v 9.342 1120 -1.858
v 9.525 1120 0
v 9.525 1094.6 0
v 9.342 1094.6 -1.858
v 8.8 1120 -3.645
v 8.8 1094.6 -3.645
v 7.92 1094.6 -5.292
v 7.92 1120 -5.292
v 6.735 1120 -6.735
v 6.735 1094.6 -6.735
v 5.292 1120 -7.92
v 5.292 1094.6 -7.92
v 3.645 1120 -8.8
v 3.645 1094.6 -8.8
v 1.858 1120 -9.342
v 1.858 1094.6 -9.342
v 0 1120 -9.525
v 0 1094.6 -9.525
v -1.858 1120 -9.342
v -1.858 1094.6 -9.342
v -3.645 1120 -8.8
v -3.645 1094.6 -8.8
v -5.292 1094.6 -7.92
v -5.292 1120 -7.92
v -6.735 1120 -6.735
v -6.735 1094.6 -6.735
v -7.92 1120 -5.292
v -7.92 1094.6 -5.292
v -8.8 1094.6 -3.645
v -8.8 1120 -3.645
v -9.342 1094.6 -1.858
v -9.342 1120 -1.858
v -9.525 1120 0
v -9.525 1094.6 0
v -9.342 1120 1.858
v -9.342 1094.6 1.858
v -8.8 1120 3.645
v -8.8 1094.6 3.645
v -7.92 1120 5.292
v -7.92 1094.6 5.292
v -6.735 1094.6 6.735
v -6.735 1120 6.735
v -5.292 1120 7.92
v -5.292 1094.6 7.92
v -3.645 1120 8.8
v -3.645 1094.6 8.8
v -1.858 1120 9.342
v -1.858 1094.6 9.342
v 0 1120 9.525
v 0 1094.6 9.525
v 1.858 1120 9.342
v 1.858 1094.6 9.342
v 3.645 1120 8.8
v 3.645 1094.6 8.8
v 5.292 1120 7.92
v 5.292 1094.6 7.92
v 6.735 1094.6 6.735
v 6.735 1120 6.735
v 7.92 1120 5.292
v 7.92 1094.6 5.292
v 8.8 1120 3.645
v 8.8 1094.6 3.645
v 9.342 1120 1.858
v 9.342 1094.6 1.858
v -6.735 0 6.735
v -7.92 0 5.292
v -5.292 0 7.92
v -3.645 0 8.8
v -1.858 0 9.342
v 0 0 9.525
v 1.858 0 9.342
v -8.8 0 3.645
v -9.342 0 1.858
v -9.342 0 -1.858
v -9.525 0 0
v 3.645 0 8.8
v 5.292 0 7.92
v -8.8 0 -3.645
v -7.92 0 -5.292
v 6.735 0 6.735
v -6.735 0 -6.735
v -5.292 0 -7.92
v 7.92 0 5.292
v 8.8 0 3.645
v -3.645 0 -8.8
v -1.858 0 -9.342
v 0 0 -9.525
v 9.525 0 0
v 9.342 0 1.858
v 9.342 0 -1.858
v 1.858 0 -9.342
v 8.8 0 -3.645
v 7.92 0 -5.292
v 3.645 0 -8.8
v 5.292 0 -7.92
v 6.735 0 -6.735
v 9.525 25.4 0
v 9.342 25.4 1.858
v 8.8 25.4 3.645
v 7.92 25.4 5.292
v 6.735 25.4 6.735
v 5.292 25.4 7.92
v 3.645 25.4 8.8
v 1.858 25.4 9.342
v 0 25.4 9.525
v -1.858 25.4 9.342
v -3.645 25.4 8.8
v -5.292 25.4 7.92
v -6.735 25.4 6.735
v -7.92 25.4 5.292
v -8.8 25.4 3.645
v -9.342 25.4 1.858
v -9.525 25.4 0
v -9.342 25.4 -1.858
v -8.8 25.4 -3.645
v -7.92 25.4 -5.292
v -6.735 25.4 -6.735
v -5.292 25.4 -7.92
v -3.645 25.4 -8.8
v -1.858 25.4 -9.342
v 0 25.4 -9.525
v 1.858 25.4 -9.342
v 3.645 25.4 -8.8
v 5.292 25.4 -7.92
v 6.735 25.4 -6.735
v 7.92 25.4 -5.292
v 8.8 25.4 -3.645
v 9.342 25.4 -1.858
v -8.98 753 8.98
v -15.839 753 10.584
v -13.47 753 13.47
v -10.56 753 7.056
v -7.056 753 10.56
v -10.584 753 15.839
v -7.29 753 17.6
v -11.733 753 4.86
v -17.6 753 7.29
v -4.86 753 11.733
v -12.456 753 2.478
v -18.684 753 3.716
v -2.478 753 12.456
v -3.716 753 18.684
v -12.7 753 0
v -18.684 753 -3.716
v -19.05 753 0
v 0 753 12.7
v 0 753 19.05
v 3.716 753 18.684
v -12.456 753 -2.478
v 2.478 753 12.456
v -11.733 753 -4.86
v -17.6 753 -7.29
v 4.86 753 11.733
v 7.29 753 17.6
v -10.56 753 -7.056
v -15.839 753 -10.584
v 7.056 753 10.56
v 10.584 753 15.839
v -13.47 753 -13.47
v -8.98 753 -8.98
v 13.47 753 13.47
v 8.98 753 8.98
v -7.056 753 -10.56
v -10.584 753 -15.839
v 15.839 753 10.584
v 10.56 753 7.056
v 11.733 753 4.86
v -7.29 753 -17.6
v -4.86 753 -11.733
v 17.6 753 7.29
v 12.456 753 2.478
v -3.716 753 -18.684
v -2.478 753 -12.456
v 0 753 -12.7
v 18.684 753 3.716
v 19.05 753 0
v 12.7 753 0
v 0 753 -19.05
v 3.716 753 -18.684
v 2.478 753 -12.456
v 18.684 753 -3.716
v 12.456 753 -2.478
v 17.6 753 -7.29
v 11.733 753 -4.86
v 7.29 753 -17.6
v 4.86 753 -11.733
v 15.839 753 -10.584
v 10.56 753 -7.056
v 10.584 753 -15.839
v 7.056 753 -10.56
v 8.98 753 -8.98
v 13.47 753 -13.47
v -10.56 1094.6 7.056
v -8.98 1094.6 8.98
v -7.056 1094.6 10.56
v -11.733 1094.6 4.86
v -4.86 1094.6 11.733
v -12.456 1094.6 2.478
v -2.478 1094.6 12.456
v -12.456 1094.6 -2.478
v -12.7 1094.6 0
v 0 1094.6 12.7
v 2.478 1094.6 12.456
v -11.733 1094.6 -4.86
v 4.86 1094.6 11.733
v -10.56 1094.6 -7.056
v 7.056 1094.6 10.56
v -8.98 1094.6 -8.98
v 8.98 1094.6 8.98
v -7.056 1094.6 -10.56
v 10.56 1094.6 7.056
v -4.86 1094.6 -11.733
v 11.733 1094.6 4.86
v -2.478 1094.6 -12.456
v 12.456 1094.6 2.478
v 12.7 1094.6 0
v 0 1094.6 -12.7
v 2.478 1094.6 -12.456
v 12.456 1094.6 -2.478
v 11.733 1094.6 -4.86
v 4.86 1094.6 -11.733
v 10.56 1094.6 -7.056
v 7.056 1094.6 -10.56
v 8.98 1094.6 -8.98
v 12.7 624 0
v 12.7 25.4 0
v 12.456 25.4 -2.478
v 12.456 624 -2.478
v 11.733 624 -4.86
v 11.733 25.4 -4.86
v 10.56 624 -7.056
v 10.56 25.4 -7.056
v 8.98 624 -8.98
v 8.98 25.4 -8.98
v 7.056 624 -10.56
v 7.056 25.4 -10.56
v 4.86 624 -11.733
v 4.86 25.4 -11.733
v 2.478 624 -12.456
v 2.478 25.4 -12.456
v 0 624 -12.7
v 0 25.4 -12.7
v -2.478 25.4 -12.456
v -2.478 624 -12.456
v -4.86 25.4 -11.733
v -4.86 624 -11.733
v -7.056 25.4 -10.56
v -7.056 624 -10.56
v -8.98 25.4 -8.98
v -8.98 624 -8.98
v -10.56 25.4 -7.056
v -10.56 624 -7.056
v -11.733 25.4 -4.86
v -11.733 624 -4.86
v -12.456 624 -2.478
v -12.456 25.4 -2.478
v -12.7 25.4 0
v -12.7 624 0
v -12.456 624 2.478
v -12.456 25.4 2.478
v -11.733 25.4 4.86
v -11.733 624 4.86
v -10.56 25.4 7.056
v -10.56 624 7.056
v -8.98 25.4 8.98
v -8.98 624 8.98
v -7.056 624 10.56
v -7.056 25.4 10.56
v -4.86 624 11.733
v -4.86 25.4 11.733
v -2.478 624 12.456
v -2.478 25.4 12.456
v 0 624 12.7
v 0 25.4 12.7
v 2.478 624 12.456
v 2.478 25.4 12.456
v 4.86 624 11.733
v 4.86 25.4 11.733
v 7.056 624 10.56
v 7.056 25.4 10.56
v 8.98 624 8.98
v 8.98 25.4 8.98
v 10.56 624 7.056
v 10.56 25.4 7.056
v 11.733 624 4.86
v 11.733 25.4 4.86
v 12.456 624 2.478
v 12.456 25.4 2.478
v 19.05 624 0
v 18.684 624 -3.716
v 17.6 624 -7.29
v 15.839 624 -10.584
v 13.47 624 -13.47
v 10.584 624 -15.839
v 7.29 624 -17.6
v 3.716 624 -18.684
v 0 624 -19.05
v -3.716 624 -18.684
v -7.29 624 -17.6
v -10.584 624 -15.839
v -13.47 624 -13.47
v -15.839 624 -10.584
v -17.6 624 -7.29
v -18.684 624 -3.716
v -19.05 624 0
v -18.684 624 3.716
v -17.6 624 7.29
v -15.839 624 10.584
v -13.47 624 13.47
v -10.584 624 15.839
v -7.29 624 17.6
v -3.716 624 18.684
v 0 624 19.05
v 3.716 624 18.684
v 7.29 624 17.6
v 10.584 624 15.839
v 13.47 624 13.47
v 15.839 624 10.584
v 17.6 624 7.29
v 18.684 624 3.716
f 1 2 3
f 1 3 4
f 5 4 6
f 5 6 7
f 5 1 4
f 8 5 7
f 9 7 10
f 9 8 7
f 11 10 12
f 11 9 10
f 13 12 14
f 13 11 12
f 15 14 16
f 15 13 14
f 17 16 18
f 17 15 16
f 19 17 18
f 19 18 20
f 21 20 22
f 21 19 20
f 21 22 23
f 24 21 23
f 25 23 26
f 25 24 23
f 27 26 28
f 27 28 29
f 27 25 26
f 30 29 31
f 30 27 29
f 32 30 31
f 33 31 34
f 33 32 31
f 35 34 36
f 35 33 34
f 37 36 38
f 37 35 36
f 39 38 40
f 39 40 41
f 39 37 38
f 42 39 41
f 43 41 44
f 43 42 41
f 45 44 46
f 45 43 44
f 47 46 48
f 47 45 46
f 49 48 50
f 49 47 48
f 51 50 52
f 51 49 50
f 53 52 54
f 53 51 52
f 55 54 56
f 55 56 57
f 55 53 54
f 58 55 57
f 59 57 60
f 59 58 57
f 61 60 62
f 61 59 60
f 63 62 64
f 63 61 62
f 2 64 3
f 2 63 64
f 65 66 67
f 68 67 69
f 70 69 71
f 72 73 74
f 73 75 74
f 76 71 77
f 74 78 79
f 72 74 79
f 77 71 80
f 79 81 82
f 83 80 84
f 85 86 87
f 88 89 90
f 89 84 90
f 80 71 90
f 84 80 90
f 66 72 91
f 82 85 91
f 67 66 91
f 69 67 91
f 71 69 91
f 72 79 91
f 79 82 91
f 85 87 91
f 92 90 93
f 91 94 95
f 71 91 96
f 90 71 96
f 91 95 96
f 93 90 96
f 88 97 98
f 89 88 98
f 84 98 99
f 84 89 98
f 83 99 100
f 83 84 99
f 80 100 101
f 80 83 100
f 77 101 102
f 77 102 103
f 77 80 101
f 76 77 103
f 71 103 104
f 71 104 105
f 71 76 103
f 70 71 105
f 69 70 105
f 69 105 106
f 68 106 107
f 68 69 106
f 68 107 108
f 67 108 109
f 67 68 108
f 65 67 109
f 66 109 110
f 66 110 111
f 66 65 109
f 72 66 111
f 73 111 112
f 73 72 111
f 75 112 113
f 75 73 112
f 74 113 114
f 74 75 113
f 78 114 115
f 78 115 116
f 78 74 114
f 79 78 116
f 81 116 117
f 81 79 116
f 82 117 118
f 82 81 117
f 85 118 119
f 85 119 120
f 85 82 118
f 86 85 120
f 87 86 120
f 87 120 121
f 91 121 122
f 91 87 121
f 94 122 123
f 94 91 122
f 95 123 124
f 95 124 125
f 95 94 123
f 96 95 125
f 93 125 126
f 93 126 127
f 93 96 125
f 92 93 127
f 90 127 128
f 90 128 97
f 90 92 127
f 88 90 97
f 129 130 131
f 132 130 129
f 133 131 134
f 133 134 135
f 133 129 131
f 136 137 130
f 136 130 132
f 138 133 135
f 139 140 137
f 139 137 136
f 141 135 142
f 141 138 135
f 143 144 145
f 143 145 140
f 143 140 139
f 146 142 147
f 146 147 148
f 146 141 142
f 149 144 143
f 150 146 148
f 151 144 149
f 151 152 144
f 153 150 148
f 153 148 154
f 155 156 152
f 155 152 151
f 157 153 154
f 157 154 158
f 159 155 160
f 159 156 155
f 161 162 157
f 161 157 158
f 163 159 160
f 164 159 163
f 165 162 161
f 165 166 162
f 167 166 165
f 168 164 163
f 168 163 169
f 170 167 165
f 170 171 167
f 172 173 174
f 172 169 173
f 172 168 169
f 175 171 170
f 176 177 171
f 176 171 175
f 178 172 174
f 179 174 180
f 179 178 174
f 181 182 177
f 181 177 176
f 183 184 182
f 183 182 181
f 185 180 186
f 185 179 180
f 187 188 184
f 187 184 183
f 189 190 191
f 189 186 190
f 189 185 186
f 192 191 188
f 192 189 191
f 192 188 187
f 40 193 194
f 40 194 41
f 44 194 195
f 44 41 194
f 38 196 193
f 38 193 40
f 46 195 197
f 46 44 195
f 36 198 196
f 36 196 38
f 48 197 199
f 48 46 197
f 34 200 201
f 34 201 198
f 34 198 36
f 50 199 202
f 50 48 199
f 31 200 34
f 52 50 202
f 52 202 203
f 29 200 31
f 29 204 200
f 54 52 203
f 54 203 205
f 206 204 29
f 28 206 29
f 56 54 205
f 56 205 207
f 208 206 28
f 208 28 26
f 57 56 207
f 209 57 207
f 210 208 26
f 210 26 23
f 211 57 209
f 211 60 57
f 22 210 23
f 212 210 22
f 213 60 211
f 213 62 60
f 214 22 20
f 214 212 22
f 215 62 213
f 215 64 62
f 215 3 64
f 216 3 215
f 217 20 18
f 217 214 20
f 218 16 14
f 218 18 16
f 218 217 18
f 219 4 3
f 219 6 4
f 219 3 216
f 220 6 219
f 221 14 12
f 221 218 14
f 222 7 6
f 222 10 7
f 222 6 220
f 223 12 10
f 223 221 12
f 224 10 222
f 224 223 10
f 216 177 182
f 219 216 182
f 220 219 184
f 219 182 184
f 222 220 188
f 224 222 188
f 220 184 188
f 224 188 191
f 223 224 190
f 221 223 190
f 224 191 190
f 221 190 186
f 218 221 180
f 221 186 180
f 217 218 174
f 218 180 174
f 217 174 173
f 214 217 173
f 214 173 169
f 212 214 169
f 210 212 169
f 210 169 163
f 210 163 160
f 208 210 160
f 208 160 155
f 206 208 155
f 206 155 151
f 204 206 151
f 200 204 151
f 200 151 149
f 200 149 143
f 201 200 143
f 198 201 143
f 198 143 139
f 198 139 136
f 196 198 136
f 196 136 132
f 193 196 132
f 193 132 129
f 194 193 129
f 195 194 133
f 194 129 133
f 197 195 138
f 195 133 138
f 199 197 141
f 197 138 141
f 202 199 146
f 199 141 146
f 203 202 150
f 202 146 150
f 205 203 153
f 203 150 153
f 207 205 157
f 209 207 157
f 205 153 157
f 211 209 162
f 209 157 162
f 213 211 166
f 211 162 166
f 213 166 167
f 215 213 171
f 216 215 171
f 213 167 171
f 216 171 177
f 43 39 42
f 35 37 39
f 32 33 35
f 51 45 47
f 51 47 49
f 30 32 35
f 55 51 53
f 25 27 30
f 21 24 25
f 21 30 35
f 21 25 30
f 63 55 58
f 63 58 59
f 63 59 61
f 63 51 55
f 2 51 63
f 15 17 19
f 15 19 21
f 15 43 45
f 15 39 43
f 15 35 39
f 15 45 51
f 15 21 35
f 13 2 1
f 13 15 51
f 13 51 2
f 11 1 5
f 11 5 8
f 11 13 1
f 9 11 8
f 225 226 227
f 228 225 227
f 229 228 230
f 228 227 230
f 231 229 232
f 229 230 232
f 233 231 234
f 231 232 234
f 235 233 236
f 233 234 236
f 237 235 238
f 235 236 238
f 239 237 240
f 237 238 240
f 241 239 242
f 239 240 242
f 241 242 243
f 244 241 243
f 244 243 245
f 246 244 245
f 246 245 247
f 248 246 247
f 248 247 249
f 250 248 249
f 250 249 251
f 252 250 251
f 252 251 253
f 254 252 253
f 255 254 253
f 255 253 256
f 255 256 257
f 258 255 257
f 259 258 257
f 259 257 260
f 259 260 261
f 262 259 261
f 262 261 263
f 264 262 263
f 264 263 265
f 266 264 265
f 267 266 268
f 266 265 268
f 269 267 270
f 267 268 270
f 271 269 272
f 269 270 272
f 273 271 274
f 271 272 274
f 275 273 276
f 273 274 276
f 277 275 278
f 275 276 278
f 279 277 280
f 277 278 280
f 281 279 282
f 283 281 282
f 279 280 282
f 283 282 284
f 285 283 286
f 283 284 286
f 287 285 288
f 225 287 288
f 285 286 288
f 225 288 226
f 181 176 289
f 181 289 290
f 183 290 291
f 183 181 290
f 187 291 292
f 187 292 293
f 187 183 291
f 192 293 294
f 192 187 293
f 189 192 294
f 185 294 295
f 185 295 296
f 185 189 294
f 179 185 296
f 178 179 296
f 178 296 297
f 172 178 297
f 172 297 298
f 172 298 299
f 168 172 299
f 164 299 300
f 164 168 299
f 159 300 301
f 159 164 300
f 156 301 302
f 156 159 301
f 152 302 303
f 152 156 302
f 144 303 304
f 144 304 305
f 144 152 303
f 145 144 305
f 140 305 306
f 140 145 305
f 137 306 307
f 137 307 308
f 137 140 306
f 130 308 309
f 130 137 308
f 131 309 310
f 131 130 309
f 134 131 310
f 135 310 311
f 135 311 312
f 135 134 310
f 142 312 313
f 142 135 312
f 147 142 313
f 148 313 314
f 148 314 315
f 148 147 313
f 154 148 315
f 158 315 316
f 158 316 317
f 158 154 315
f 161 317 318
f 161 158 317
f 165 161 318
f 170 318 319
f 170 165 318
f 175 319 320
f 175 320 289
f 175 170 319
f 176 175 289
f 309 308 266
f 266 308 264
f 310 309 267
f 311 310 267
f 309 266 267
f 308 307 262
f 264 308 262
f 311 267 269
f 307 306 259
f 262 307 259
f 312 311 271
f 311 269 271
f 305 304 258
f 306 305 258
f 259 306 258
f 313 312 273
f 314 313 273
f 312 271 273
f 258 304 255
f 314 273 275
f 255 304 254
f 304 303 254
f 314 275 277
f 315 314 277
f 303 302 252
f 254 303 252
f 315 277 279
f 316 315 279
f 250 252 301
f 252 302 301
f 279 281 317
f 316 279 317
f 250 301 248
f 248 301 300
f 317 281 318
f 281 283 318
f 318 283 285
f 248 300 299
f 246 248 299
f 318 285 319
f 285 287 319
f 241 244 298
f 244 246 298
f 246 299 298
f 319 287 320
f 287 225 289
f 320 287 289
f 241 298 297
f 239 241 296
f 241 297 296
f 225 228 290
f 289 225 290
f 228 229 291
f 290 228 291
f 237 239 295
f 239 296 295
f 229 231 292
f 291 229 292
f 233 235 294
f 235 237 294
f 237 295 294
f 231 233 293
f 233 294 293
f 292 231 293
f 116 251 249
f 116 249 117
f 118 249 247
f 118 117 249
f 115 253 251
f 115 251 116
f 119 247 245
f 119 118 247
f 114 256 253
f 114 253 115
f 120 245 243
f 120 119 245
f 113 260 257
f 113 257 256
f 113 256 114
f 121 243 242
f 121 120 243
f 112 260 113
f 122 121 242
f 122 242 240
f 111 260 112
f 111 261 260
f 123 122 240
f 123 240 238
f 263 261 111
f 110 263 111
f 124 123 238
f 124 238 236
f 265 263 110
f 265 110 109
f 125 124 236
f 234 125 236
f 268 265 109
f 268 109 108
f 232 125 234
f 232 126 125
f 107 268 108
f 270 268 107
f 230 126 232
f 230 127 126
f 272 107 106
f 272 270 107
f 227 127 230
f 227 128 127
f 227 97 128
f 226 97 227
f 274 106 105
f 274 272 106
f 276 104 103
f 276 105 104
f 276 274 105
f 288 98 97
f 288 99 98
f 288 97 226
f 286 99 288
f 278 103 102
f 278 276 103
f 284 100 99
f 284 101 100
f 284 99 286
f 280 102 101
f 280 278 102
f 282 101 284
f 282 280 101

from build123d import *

# Parameters (mm, degrees)
SKETCH1_R           = 12.7
BOSS_EXTRUDE1_DEPTH = 1120
SKETCH3_R           = 12.7
SKETCH3_R_2         = 9.525
CUT_EXTRUDE1_DEPTH  = 25.4
SKETCH4_R           = 12.7
SKETCH4_R_2         = 9.525
CUT_EXTRUDE2_DEPTH  = 25.4
SKETCH5_R           = 19.05
SKETCH5_R_2         = 12.7
BOSS_EXTRUDE2_DEPTH = 129


with BuildPart() as part:
    # Sketch1 → Boss-Extrude1 (new body)
    with BuildSketch(Plane(origin=(0, 0, 0), x_dir=(1, 0, 0), z_dir=(0, 1, 0))):
        Circle(SKETCH1_R)
    extrude(amount=BOSS_EXTRUDE1_DEPTH)

    # Sketch3 → Cut-Extrude1 (cut)
    with BuildSketch(Plane.XZ):
        Circle(SKETCH3_R)
        Circle(SKETCH3_R_2, mode=Mode.SUBTRACT)
    extrude(amount=-CUT_EXTRUDE1_DEPTH, mode=Mode.SUBTRACT)

    # Sketch4 → Cut-Extrude2 (cut)
    with BuildSketch(Plane(origin=(0, 1120, 0), x_dir=(1, 0, 0), z_dir=(0, 1, 0))):
        Circle(SKETCH4_R)
        Circle(SKETCH4_R_2, mode=Mode.SUBTRACT)
    extrude(amount=-CUT_EXTRUDE2_DEPTH, mode=Mode.SUBTRACT)

    # Sketch5 → Boss-Extrude2 (add)
    with BuildSketch(Plane(origin=(0, 753, 0), x_dir=(1, 0, 0), z_dir=(0, 1, 0))):
        Circle(SKETCH5_R)
        Circle(SKETCH5_R_2, mode=Mode.SUBTRACT)
    extrude(amount=-BOSS_EXTRUDE2_DEPTH)


solid = part.part
